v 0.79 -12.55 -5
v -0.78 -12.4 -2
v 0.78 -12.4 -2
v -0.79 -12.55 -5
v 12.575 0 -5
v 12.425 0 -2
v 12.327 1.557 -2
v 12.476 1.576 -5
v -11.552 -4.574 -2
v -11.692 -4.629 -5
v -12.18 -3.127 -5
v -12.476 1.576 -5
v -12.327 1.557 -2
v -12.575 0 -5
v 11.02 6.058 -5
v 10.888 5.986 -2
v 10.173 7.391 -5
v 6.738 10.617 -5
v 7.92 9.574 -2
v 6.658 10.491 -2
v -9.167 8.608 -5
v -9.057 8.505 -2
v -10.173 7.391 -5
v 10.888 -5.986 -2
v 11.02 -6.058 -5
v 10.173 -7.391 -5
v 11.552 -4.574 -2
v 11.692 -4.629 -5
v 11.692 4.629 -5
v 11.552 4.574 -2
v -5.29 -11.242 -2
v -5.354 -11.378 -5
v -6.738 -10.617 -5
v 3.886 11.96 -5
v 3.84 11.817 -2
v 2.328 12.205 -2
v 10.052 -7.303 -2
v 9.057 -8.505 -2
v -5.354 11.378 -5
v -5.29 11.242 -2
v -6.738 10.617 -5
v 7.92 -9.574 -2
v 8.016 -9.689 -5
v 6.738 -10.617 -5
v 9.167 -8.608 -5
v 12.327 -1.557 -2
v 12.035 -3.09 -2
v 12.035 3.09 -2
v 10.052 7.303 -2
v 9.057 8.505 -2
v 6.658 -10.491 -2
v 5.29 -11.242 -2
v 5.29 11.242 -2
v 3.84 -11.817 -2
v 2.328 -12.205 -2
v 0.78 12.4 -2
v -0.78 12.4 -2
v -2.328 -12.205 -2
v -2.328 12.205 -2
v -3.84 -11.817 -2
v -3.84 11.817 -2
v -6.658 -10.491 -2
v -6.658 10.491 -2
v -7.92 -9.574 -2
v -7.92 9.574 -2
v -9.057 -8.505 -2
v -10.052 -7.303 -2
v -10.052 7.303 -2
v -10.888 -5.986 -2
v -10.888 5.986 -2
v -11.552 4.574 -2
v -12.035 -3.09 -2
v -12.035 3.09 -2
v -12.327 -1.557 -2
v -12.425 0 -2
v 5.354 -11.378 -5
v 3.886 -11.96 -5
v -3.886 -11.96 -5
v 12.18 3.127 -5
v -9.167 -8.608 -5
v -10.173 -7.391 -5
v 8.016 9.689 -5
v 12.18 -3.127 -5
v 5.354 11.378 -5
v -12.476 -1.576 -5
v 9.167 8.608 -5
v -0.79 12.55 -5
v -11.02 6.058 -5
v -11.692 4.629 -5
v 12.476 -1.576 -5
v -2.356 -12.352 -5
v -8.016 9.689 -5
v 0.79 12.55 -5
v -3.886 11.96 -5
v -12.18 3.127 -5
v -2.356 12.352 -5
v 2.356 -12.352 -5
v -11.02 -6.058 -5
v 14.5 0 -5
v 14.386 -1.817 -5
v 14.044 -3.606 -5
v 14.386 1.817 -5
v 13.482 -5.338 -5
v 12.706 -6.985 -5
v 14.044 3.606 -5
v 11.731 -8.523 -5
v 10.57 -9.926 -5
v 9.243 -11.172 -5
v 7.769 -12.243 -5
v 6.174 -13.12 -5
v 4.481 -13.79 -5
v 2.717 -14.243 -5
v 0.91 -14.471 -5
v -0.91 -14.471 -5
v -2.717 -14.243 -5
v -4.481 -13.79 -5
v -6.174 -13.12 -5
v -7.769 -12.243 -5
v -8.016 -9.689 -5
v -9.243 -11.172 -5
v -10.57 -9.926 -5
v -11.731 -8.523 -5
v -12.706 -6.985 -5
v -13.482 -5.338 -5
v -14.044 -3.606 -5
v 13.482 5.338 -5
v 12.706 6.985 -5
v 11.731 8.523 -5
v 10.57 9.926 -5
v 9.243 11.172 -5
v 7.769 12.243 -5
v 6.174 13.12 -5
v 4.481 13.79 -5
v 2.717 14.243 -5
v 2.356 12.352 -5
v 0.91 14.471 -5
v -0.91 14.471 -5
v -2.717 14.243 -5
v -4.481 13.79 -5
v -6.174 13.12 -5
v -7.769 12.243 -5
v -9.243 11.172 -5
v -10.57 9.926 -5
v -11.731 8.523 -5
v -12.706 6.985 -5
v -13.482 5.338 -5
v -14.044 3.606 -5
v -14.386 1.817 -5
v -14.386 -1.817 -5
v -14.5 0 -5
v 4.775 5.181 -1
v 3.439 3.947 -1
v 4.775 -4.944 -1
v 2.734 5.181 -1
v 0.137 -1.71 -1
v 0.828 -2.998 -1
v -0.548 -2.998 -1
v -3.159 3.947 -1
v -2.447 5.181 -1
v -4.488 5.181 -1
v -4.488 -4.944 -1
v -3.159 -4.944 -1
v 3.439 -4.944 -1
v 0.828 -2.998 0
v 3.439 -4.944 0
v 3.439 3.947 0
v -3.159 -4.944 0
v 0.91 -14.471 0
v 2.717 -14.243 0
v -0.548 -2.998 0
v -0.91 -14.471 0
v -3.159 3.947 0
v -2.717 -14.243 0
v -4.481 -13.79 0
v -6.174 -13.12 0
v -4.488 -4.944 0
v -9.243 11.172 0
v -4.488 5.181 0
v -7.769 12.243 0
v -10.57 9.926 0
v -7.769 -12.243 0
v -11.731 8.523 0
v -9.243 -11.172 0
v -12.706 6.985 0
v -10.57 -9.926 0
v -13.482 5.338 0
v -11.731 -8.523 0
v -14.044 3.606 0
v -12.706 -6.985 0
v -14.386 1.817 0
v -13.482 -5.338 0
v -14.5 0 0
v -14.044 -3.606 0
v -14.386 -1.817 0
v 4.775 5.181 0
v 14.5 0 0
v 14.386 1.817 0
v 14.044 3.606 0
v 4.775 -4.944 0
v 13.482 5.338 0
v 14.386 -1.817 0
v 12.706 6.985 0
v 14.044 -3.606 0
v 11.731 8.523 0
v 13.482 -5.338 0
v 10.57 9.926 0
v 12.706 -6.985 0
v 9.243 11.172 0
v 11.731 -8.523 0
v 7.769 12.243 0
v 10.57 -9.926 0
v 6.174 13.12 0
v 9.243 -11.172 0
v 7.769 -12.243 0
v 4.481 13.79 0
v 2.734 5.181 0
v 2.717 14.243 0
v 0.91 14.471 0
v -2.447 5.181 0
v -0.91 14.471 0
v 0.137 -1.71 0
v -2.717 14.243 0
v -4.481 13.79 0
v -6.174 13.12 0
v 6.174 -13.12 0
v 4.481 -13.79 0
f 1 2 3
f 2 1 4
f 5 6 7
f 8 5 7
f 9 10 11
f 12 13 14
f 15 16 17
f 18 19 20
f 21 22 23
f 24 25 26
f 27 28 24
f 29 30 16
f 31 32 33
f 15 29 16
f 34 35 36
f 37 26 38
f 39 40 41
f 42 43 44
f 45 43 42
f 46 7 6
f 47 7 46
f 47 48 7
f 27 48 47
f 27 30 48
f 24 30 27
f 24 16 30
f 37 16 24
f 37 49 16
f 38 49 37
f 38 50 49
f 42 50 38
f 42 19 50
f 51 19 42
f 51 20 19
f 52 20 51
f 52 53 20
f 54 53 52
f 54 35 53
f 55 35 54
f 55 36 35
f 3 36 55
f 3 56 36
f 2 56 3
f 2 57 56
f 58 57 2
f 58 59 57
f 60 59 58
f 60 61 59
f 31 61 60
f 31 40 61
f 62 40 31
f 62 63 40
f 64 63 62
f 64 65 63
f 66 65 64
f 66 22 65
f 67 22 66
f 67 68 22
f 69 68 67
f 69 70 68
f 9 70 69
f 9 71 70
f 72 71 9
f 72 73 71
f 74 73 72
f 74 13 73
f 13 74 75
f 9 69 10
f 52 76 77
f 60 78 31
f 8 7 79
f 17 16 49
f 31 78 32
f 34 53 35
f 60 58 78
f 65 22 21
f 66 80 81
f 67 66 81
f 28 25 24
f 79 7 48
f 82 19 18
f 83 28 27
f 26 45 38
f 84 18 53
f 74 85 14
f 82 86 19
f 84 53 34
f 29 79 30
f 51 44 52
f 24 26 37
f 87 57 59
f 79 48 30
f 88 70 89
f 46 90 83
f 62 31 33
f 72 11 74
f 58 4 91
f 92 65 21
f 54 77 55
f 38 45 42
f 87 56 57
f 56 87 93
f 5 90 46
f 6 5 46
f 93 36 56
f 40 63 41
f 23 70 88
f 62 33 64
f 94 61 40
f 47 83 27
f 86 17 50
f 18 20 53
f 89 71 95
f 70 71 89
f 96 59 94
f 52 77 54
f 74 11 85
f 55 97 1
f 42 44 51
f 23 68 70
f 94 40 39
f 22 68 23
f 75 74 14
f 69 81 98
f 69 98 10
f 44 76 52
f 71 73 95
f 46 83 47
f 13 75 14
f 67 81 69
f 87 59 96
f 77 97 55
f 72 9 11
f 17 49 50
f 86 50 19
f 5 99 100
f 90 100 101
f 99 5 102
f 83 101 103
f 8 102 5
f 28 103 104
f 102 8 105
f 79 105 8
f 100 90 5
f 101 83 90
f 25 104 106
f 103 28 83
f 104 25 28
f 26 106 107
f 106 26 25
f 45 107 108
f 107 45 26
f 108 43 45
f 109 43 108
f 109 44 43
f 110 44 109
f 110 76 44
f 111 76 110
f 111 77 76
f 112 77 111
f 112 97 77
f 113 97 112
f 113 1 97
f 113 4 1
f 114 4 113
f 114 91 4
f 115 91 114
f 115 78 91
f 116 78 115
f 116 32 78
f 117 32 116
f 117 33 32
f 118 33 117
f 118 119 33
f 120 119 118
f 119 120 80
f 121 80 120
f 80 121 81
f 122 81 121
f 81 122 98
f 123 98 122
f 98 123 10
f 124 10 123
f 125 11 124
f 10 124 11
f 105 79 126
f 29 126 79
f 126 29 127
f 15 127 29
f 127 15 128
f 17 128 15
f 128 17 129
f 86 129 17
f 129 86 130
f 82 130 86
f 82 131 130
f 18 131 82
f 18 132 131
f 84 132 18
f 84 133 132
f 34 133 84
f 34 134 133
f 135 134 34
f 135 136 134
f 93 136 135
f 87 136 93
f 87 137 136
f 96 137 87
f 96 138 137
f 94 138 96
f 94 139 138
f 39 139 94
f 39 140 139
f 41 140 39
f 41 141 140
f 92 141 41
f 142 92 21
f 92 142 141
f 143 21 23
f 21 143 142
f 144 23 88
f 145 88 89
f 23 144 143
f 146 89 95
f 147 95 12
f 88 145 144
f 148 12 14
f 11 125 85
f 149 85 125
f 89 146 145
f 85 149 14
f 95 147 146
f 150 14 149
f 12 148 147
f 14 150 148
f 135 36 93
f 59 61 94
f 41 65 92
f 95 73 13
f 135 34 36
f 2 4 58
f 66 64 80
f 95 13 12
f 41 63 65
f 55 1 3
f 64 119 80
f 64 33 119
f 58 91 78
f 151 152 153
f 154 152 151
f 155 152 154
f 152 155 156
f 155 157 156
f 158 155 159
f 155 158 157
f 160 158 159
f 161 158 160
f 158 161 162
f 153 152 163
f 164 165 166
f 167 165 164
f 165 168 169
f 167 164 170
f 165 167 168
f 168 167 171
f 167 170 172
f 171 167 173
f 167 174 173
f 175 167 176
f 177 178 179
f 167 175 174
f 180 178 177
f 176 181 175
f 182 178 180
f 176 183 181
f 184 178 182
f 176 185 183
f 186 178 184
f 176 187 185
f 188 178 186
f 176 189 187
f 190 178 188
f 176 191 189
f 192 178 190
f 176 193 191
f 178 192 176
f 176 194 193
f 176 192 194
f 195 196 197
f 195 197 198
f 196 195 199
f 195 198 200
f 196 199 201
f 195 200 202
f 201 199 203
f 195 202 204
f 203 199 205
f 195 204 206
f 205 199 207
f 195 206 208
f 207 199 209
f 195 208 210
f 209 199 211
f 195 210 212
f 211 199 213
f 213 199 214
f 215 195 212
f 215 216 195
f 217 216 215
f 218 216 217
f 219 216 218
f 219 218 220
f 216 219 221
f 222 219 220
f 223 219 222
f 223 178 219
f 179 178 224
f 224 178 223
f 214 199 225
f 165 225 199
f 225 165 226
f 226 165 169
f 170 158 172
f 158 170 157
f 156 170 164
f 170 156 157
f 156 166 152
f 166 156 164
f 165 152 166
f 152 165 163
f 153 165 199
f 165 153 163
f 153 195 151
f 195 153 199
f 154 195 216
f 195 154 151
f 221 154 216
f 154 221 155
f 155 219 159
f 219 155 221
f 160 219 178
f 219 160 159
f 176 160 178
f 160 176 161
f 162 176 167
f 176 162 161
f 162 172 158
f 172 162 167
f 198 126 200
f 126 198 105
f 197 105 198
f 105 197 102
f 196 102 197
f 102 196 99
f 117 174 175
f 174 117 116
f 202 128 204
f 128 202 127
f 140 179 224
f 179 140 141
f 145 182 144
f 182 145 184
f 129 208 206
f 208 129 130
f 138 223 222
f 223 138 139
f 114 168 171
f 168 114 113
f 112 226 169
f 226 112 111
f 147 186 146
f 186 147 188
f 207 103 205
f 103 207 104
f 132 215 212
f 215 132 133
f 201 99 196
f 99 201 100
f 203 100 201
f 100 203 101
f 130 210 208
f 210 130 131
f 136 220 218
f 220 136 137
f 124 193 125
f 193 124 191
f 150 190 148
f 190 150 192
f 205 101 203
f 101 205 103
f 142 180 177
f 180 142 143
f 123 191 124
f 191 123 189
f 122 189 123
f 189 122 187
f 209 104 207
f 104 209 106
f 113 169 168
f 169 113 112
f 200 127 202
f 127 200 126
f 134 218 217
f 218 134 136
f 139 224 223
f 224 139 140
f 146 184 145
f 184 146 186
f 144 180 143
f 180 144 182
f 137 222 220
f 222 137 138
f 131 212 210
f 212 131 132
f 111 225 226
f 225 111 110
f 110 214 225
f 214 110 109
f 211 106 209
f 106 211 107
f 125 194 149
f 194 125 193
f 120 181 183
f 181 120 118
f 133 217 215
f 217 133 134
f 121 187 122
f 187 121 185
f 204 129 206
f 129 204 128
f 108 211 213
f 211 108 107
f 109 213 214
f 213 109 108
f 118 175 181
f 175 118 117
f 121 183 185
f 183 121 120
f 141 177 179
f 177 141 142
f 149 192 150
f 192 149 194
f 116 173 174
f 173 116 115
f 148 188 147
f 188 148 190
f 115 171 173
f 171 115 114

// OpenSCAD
$fn = 50;

difference() {
	union() {
		translate(v = [0, 0, -5.0]) {
			cylinder(h = 5, r = 14.5);
		}
	}
	union() {
		#translate(v = [0, 0, -5.0]) {
			cylinder(h = 3, r1 = 12.575, r2 = 12.425);
		}
		translate(v = [0, 0, -1]) {
			linear_extrude(height = 1) {
				text(font = "Impact", halign = "center", size = 10, text = "M", valign = "center");
			}
		}
	}
}
